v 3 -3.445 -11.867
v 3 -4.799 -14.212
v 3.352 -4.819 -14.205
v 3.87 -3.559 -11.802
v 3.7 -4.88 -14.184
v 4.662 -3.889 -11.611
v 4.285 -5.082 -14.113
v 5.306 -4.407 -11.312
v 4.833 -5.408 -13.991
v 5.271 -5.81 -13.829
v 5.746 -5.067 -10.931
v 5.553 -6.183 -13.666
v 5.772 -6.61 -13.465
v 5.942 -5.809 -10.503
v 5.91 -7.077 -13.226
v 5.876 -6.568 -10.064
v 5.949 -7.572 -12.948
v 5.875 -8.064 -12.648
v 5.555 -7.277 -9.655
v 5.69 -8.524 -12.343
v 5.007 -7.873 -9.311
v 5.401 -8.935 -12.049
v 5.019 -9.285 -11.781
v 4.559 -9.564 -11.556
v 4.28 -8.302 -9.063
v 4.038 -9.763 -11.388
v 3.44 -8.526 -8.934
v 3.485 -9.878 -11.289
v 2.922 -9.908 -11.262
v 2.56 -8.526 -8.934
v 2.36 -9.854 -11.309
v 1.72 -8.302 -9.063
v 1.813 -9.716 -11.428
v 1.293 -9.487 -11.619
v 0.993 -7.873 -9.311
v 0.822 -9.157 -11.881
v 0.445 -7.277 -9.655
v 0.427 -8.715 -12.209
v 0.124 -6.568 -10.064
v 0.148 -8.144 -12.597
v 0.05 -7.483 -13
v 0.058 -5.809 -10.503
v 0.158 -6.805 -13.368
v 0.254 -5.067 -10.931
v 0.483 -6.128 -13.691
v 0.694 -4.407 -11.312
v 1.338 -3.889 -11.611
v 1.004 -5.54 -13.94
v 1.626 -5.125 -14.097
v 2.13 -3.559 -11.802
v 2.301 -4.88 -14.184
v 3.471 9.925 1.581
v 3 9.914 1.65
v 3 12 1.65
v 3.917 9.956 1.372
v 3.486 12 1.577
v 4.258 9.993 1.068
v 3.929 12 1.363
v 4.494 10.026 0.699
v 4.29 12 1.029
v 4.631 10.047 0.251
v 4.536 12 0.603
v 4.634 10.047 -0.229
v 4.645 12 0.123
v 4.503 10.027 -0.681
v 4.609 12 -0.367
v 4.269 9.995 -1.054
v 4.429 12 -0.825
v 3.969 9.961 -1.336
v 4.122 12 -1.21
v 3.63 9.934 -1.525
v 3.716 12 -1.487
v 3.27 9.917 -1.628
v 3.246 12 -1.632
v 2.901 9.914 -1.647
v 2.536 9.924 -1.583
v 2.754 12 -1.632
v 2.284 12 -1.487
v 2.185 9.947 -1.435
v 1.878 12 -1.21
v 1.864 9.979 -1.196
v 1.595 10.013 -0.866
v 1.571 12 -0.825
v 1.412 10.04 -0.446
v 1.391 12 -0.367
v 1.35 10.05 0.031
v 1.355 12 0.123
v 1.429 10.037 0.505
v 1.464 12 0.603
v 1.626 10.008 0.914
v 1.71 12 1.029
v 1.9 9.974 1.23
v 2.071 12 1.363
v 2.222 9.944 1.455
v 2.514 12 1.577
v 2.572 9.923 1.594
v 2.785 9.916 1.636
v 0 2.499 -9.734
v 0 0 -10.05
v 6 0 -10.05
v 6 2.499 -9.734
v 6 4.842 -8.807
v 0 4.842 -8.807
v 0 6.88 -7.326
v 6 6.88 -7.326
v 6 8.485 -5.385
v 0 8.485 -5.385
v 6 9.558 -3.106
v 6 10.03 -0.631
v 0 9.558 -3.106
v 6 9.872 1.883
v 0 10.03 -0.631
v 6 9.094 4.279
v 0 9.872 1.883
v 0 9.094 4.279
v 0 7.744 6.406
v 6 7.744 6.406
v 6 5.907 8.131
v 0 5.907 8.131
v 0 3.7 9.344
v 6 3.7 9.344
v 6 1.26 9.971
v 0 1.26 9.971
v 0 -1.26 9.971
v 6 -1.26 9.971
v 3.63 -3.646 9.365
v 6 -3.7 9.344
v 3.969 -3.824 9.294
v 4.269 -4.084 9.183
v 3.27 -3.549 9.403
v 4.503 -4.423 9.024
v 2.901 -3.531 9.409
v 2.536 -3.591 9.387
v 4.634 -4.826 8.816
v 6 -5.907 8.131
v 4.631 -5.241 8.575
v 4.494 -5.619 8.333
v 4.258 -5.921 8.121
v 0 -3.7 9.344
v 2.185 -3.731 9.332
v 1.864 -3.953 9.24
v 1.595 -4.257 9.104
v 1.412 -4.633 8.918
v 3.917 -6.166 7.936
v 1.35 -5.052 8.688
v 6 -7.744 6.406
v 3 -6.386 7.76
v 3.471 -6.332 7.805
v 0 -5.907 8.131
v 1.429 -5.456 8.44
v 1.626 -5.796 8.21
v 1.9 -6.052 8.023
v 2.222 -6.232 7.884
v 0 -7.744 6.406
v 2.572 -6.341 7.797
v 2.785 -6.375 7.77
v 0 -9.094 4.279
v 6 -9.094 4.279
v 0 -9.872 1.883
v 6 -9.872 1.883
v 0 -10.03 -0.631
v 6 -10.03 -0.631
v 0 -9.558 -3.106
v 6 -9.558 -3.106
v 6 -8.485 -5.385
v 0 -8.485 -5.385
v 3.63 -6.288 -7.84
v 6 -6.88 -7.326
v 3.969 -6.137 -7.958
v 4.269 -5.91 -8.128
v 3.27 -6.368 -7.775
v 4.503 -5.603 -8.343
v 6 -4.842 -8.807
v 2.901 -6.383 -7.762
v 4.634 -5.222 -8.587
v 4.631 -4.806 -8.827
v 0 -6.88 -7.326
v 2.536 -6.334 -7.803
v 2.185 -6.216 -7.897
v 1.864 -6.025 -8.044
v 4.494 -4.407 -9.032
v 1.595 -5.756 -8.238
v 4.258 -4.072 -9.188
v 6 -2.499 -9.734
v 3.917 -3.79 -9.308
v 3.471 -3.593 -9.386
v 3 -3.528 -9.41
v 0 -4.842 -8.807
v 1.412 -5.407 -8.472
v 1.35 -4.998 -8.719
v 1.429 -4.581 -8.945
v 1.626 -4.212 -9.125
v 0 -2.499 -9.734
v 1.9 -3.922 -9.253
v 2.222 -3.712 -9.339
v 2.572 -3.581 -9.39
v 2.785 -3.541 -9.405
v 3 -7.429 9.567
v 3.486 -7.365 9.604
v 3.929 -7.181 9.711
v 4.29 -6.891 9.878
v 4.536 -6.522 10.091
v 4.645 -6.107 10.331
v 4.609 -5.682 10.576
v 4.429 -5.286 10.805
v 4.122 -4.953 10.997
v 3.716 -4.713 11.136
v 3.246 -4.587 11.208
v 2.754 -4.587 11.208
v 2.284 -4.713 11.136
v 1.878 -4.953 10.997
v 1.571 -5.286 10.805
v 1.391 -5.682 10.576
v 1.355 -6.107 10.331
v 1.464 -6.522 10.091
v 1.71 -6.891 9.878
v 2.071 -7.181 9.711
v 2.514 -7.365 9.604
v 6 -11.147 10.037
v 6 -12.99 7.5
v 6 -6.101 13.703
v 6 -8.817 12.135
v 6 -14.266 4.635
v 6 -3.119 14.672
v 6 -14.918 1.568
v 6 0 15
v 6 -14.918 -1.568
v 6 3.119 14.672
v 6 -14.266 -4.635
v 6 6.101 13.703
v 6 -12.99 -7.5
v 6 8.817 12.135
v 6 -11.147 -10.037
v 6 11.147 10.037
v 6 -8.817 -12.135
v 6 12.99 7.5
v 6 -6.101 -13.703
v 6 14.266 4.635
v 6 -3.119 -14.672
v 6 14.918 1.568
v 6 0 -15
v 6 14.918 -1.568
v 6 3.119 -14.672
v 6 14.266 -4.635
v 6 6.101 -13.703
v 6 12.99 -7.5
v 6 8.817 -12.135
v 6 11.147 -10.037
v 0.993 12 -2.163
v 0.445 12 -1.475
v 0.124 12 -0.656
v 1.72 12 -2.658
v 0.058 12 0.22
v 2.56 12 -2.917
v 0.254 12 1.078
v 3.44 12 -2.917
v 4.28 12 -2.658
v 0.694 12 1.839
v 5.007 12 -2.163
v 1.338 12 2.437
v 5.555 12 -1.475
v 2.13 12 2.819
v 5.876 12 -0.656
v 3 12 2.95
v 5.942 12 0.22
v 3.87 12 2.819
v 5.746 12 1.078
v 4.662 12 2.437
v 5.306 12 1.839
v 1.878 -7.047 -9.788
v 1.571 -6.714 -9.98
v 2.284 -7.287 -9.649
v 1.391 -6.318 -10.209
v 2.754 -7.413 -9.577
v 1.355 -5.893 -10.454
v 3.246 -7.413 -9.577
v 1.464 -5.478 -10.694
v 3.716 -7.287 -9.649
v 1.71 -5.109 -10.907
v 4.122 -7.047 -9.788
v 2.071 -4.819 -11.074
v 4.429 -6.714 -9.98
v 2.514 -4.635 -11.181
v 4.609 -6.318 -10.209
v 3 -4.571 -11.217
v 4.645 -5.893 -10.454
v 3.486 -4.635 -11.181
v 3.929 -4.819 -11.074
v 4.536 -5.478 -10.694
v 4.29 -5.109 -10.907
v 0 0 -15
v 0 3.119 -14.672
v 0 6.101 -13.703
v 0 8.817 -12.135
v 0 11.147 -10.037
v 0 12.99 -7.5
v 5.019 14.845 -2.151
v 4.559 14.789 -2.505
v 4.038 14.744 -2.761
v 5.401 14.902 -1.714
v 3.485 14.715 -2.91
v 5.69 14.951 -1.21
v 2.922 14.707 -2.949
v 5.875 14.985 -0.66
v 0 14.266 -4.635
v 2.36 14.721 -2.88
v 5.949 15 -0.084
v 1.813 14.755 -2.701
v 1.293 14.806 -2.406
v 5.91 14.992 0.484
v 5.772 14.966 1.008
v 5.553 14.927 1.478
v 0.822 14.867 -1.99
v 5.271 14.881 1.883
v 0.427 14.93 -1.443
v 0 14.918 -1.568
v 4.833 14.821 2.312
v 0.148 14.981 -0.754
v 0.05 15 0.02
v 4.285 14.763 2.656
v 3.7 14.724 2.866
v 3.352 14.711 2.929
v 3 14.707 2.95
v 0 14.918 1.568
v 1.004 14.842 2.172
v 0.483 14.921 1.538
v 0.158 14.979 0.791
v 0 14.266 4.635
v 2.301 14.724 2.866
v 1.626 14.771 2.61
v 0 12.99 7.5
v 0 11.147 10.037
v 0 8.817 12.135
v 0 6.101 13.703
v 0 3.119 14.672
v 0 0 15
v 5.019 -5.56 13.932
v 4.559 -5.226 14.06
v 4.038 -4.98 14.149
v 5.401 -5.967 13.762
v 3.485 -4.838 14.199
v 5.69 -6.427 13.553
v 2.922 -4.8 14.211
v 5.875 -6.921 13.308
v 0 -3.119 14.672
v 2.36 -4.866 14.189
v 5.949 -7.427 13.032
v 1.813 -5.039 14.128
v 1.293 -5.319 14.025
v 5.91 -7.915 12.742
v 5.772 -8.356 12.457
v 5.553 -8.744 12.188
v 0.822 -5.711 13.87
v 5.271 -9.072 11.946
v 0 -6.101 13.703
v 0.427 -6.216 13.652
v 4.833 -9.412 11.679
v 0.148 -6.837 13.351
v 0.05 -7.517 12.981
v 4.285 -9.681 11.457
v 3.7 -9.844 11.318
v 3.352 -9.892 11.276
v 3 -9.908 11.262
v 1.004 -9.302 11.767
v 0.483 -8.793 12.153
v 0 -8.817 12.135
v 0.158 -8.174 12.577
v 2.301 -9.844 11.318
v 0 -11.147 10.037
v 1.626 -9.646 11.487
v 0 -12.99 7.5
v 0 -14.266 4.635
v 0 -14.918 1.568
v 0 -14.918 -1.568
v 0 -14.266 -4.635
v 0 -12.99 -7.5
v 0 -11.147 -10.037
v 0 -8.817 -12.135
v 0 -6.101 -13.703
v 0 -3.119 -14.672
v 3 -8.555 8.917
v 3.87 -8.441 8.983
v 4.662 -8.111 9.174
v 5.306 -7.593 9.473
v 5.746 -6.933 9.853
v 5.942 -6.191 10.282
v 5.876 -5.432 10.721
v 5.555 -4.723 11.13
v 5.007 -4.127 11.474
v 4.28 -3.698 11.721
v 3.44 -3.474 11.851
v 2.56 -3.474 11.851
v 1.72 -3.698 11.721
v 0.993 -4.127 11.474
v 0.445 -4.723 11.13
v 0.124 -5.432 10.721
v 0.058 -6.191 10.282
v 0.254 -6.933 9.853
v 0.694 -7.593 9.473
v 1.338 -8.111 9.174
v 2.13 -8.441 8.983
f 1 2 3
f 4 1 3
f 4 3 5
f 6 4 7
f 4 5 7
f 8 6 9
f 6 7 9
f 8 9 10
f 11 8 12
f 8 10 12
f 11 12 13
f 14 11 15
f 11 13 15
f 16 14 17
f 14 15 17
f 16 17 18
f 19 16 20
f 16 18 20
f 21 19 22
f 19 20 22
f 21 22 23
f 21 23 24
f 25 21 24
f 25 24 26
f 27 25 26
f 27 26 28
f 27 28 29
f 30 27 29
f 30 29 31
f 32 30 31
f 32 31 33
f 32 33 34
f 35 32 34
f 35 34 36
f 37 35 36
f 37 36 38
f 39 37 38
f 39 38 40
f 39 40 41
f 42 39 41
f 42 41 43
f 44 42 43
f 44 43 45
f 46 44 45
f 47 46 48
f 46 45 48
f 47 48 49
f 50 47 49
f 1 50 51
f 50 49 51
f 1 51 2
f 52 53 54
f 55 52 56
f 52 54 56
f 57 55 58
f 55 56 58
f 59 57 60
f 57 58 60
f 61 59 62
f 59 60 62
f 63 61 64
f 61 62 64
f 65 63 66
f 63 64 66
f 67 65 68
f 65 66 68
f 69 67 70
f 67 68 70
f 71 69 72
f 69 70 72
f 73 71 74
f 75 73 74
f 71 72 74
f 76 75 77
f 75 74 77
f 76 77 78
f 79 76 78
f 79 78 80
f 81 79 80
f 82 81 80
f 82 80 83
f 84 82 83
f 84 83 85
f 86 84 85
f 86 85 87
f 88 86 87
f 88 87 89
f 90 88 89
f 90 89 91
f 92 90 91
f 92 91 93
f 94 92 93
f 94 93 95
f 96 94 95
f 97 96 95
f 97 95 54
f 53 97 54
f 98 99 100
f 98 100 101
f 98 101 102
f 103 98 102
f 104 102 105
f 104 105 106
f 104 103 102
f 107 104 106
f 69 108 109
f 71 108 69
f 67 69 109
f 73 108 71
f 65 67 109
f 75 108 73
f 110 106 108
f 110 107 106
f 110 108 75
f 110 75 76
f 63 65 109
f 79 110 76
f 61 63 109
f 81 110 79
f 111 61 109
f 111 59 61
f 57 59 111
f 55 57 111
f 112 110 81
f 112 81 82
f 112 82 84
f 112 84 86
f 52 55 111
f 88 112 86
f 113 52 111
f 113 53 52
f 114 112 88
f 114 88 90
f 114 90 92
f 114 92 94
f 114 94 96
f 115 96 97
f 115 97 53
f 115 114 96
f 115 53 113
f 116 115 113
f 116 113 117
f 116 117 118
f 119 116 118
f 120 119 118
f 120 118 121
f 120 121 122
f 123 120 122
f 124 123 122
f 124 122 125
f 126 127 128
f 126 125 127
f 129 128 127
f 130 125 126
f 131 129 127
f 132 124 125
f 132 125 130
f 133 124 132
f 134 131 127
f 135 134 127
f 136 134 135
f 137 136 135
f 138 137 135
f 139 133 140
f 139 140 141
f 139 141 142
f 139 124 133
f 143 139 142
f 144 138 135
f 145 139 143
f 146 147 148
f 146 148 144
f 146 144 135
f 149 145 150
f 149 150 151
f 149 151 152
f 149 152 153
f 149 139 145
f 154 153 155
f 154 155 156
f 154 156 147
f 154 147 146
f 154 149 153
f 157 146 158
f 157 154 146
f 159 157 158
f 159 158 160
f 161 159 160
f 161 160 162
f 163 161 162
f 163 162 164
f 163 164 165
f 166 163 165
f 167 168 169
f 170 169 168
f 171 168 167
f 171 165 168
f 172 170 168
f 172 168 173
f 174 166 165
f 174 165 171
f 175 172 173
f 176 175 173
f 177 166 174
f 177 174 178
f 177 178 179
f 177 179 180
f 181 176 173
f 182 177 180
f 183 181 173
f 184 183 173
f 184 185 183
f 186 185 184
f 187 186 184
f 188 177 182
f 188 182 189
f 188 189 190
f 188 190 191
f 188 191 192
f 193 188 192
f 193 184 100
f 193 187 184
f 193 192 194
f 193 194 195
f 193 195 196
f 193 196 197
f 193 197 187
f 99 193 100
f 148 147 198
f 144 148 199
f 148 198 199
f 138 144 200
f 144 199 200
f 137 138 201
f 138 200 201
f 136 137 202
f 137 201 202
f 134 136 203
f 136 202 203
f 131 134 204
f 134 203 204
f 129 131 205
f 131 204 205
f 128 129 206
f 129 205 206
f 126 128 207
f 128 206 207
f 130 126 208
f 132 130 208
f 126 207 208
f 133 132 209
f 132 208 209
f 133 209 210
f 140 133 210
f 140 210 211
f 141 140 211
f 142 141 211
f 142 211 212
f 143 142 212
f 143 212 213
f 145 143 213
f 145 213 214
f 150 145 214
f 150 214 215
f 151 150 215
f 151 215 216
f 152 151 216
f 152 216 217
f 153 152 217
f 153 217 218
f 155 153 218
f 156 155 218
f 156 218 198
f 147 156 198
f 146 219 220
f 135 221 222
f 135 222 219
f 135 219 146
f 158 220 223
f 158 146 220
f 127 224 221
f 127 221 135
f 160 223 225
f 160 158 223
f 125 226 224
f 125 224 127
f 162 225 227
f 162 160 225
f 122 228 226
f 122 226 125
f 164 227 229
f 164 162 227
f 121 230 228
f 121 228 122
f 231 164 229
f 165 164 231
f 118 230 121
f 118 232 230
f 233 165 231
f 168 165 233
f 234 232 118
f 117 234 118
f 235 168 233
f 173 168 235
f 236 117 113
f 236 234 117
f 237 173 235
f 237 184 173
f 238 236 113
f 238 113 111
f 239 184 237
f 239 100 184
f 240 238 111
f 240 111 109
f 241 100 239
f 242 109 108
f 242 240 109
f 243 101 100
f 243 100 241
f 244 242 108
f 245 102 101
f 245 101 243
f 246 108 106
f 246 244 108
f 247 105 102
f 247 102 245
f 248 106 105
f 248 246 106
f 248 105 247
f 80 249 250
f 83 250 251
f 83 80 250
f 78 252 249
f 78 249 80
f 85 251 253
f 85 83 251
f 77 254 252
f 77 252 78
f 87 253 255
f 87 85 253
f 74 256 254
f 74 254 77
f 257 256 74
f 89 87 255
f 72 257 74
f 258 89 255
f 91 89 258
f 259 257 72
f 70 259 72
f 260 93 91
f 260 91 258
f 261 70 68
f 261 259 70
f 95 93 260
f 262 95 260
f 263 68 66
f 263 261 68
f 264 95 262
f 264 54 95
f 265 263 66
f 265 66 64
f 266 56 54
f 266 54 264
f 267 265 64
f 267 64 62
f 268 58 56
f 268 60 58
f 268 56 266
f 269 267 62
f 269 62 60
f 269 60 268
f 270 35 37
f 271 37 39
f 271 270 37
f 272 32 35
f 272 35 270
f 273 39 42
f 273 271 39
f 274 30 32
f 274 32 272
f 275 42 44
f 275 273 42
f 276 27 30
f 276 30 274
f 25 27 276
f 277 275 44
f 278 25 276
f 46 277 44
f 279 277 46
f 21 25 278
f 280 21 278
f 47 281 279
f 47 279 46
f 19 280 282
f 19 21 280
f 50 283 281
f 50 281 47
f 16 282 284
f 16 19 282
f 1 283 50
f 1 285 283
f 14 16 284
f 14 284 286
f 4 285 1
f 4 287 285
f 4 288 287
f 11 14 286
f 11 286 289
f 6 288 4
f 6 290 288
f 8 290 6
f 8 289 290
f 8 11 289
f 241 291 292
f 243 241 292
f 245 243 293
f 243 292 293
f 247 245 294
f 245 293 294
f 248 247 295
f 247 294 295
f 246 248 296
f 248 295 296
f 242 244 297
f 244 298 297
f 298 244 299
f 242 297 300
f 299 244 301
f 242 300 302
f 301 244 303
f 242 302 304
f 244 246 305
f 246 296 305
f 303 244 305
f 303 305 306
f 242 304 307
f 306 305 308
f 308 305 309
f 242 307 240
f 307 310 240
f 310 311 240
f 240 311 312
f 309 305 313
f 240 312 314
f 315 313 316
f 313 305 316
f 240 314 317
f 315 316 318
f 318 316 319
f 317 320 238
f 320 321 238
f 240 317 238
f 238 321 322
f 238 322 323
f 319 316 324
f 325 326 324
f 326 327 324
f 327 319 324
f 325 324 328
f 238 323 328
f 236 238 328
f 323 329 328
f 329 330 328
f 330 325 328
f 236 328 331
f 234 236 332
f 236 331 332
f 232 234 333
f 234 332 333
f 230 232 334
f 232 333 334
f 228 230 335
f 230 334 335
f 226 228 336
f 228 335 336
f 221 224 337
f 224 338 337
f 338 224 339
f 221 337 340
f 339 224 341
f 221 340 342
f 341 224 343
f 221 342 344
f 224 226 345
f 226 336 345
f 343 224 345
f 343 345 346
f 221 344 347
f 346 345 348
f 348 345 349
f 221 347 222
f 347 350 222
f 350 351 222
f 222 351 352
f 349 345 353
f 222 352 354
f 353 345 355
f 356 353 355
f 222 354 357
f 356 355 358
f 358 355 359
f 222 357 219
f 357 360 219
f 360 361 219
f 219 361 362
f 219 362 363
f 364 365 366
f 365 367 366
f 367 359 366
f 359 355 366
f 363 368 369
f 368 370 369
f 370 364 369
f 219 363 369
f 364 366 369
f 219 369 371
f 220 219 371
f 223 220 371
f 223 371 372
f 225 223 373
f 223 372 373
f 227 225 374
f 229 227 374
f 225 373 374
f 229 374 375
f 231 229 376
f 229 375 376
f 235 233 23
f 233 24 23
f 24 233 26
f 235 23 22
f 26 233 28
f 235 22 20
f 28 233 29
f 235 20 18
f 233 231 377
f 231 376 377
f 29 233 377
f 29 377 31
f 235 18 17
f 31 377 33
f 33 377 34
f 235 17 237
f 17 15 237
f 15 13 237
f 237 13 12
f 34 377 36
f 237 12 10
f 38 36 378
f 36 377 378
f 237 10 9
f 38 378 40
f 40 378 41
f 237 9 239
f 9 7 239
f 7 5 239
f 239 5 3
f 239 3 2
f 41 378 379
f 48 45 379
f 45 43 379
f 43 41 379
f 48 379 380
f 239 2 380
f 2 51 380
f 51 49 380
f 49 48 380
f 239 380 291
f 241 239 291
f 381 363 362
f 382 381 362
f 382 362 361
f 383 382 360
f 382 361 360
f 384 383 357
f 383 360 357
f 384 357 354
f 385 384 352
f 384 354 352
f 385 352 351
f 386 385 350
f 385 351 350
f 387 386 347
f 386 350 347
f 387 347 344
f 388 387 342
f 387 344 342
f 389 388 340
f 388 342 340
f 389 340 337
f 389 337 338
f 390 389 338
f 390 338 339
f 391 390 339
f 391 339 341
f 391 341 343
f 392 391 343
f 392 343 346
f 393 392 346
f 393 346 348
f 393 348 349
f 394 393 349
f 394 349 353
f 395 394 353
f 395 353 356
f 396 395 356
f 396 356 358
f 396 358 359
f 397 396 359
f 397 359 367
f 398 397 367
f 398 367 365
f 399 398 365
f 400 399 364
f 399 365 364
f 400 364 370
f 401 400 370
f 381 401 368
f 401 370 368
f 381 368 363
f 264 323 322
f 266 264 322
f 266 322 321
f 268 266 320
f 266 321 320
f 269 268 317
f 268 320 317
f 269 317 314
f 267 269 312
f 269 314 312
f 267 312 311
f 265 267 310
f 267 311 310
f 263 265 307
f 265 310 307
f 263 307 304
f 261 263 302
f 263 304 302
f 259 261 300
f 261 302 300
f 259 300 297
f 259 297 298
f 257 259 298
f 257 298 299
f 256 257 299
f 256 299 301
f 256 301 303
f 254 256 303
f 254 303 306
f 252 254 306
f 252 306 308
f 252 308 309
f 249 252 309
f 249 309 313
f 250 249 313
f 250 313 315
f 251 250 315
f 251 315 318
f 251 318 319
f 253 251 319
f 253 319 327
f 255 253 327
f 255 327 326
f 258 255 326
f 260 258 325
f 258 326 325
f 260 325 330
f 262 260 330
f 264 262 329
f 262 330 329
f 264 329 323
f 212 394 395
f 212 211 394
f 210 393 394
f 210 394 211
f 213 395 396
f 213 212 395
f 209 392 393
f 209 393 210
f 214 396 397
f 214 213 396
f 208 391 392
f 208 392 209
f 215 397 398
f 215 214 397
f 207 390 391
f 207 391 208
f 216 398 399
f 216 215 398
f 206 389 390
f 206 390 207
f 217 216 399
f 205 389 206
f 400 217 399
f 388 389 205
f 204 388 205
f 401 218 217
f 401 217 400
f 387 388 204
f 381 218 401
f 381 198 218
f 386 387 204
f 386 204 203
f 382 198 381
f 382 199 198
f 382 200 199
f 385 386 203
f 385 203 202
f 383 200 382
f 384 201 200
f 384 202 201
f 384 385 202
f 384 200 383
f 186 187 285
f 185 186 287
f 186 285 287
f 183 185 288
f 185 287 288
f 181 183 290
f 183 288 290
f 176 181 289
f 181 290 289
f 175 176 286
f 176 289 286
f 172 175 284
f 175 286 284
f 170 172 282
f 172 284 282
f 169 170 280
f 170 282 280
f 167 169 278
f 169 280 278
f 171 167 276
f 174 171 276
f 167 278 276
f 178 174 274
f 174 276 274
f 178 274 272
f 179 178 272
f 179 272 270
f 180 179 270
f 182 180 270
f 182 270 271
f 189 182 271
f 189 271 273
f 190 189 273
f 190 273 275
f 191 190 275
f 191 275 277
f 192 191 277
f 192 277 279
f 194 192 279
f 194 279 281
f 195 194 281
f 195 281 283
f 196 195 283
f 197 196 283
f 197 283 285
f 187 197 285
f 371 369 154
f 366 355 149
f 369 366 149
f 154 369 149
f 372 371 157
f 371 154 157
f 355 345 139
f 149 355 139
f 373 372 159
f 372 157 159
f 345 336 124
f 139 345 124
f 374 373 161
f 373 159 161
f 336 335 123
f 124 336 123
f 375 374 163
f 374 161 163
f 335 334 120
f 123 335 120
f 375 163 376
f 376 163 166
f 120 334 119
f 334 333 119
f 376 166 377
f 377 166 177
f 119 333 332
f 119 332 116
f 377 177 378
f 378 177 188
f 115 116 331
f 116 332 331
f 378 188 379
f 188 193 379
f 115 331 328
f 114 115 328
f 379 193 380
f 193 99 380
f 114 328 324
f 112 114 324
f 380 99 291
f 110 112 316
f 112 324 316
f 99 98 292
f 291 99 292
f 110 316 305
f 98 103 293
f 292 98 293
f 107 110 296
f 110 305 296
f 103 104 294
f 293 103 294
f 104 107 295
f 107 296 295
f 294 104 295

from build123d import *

# Parameters (mm, degrees)
SKETCH1_R           = 15
SKETCH1_R_2         = 10.05
BOSS_EXTRUDE1_DEPTH = 6
SKETCH3_R           = 2.95
CUT_EXTRUDE1_DEPTH  = 3
CIRPATTERN1_COUNT   = 3
SKETCH4_R           = 1.65
CUT_EXTRUDE2_DEPTH  = 11
CIRPATTERN3_COUNT   = 3


with BuildPart() as part:
    # Sketch1 → Boss-Extrude1 (new body)
    with BuildSketch(Plane(origin=(0, 0, 0), x_dir=(0, 0, -1), z_dir=(1, 0, 0))):
        Circle(SKETCH1_R)
        Circle(SKETCH1_R_2, mode=Mode.SUBTRACT)
    extrude(amount=BOSS_EXTRUDE1_DEPTH)

    # Sketch3 → Cut-Extrude1 (cut)
    with BuildSketch(Plane(origin=(0, -7.5, 12.990381057), x_dir=(1, 0, 0), z_dir=(0, -0.5000000000000044, 0.866025403784436))):
        with Locations(Location((3, 0, 0), (0, 0, 270))):
            Circle(SKETCH3_R)
    cut_extrude1 = extrude(amount=-CUT_EXTRUDE1_DEPTH, mode=Mode.SUBTRACT)

    # CirPattern1: Cut-Extrude1 ×3 about axis
    cirpattern1_axis = Axis((0, 0, 0), (1, 0, 0))
    for i in range(1, CIRPATTERN1_COUNT):
        add(cut_extrude1.rotate(cirpattern1_axis, i * 360 / CIRPATTERN1_COUNT), mode=Mode.SUBTRACT)

    # Sketch4 → Cut-Extrude2 (cut)
    with BuildSketch(Plane(origin=(0, -7.5, 12.990381057), x_dir=(1, 0, 0), z_dir=(0, -0.5000000000000044, 0.866025403784436))):
        with Locations(Location((3, 0, 0), (0, 0, 270))):
            Circle(SKETCH4_R)
    cut_extrude2 = extrude(amount=-CUT_EXTRUDE2_DEPTH, mode=Mode.SUBTRACT)

    # CirPattern3: Cut-Extrude2 ×3 about axis
    cirpattern3_axis = Axis((6, 0, 0), (-1, 0, 0))
    for i in range(1, CIRPATTERN3_COUNT):
        add(cut_extrude2.rotate(cirpattern3_axis, i * 360 / CIRPATTERN3_COUNT), mode=Mode.SUBTRACT)


solid = part.part
